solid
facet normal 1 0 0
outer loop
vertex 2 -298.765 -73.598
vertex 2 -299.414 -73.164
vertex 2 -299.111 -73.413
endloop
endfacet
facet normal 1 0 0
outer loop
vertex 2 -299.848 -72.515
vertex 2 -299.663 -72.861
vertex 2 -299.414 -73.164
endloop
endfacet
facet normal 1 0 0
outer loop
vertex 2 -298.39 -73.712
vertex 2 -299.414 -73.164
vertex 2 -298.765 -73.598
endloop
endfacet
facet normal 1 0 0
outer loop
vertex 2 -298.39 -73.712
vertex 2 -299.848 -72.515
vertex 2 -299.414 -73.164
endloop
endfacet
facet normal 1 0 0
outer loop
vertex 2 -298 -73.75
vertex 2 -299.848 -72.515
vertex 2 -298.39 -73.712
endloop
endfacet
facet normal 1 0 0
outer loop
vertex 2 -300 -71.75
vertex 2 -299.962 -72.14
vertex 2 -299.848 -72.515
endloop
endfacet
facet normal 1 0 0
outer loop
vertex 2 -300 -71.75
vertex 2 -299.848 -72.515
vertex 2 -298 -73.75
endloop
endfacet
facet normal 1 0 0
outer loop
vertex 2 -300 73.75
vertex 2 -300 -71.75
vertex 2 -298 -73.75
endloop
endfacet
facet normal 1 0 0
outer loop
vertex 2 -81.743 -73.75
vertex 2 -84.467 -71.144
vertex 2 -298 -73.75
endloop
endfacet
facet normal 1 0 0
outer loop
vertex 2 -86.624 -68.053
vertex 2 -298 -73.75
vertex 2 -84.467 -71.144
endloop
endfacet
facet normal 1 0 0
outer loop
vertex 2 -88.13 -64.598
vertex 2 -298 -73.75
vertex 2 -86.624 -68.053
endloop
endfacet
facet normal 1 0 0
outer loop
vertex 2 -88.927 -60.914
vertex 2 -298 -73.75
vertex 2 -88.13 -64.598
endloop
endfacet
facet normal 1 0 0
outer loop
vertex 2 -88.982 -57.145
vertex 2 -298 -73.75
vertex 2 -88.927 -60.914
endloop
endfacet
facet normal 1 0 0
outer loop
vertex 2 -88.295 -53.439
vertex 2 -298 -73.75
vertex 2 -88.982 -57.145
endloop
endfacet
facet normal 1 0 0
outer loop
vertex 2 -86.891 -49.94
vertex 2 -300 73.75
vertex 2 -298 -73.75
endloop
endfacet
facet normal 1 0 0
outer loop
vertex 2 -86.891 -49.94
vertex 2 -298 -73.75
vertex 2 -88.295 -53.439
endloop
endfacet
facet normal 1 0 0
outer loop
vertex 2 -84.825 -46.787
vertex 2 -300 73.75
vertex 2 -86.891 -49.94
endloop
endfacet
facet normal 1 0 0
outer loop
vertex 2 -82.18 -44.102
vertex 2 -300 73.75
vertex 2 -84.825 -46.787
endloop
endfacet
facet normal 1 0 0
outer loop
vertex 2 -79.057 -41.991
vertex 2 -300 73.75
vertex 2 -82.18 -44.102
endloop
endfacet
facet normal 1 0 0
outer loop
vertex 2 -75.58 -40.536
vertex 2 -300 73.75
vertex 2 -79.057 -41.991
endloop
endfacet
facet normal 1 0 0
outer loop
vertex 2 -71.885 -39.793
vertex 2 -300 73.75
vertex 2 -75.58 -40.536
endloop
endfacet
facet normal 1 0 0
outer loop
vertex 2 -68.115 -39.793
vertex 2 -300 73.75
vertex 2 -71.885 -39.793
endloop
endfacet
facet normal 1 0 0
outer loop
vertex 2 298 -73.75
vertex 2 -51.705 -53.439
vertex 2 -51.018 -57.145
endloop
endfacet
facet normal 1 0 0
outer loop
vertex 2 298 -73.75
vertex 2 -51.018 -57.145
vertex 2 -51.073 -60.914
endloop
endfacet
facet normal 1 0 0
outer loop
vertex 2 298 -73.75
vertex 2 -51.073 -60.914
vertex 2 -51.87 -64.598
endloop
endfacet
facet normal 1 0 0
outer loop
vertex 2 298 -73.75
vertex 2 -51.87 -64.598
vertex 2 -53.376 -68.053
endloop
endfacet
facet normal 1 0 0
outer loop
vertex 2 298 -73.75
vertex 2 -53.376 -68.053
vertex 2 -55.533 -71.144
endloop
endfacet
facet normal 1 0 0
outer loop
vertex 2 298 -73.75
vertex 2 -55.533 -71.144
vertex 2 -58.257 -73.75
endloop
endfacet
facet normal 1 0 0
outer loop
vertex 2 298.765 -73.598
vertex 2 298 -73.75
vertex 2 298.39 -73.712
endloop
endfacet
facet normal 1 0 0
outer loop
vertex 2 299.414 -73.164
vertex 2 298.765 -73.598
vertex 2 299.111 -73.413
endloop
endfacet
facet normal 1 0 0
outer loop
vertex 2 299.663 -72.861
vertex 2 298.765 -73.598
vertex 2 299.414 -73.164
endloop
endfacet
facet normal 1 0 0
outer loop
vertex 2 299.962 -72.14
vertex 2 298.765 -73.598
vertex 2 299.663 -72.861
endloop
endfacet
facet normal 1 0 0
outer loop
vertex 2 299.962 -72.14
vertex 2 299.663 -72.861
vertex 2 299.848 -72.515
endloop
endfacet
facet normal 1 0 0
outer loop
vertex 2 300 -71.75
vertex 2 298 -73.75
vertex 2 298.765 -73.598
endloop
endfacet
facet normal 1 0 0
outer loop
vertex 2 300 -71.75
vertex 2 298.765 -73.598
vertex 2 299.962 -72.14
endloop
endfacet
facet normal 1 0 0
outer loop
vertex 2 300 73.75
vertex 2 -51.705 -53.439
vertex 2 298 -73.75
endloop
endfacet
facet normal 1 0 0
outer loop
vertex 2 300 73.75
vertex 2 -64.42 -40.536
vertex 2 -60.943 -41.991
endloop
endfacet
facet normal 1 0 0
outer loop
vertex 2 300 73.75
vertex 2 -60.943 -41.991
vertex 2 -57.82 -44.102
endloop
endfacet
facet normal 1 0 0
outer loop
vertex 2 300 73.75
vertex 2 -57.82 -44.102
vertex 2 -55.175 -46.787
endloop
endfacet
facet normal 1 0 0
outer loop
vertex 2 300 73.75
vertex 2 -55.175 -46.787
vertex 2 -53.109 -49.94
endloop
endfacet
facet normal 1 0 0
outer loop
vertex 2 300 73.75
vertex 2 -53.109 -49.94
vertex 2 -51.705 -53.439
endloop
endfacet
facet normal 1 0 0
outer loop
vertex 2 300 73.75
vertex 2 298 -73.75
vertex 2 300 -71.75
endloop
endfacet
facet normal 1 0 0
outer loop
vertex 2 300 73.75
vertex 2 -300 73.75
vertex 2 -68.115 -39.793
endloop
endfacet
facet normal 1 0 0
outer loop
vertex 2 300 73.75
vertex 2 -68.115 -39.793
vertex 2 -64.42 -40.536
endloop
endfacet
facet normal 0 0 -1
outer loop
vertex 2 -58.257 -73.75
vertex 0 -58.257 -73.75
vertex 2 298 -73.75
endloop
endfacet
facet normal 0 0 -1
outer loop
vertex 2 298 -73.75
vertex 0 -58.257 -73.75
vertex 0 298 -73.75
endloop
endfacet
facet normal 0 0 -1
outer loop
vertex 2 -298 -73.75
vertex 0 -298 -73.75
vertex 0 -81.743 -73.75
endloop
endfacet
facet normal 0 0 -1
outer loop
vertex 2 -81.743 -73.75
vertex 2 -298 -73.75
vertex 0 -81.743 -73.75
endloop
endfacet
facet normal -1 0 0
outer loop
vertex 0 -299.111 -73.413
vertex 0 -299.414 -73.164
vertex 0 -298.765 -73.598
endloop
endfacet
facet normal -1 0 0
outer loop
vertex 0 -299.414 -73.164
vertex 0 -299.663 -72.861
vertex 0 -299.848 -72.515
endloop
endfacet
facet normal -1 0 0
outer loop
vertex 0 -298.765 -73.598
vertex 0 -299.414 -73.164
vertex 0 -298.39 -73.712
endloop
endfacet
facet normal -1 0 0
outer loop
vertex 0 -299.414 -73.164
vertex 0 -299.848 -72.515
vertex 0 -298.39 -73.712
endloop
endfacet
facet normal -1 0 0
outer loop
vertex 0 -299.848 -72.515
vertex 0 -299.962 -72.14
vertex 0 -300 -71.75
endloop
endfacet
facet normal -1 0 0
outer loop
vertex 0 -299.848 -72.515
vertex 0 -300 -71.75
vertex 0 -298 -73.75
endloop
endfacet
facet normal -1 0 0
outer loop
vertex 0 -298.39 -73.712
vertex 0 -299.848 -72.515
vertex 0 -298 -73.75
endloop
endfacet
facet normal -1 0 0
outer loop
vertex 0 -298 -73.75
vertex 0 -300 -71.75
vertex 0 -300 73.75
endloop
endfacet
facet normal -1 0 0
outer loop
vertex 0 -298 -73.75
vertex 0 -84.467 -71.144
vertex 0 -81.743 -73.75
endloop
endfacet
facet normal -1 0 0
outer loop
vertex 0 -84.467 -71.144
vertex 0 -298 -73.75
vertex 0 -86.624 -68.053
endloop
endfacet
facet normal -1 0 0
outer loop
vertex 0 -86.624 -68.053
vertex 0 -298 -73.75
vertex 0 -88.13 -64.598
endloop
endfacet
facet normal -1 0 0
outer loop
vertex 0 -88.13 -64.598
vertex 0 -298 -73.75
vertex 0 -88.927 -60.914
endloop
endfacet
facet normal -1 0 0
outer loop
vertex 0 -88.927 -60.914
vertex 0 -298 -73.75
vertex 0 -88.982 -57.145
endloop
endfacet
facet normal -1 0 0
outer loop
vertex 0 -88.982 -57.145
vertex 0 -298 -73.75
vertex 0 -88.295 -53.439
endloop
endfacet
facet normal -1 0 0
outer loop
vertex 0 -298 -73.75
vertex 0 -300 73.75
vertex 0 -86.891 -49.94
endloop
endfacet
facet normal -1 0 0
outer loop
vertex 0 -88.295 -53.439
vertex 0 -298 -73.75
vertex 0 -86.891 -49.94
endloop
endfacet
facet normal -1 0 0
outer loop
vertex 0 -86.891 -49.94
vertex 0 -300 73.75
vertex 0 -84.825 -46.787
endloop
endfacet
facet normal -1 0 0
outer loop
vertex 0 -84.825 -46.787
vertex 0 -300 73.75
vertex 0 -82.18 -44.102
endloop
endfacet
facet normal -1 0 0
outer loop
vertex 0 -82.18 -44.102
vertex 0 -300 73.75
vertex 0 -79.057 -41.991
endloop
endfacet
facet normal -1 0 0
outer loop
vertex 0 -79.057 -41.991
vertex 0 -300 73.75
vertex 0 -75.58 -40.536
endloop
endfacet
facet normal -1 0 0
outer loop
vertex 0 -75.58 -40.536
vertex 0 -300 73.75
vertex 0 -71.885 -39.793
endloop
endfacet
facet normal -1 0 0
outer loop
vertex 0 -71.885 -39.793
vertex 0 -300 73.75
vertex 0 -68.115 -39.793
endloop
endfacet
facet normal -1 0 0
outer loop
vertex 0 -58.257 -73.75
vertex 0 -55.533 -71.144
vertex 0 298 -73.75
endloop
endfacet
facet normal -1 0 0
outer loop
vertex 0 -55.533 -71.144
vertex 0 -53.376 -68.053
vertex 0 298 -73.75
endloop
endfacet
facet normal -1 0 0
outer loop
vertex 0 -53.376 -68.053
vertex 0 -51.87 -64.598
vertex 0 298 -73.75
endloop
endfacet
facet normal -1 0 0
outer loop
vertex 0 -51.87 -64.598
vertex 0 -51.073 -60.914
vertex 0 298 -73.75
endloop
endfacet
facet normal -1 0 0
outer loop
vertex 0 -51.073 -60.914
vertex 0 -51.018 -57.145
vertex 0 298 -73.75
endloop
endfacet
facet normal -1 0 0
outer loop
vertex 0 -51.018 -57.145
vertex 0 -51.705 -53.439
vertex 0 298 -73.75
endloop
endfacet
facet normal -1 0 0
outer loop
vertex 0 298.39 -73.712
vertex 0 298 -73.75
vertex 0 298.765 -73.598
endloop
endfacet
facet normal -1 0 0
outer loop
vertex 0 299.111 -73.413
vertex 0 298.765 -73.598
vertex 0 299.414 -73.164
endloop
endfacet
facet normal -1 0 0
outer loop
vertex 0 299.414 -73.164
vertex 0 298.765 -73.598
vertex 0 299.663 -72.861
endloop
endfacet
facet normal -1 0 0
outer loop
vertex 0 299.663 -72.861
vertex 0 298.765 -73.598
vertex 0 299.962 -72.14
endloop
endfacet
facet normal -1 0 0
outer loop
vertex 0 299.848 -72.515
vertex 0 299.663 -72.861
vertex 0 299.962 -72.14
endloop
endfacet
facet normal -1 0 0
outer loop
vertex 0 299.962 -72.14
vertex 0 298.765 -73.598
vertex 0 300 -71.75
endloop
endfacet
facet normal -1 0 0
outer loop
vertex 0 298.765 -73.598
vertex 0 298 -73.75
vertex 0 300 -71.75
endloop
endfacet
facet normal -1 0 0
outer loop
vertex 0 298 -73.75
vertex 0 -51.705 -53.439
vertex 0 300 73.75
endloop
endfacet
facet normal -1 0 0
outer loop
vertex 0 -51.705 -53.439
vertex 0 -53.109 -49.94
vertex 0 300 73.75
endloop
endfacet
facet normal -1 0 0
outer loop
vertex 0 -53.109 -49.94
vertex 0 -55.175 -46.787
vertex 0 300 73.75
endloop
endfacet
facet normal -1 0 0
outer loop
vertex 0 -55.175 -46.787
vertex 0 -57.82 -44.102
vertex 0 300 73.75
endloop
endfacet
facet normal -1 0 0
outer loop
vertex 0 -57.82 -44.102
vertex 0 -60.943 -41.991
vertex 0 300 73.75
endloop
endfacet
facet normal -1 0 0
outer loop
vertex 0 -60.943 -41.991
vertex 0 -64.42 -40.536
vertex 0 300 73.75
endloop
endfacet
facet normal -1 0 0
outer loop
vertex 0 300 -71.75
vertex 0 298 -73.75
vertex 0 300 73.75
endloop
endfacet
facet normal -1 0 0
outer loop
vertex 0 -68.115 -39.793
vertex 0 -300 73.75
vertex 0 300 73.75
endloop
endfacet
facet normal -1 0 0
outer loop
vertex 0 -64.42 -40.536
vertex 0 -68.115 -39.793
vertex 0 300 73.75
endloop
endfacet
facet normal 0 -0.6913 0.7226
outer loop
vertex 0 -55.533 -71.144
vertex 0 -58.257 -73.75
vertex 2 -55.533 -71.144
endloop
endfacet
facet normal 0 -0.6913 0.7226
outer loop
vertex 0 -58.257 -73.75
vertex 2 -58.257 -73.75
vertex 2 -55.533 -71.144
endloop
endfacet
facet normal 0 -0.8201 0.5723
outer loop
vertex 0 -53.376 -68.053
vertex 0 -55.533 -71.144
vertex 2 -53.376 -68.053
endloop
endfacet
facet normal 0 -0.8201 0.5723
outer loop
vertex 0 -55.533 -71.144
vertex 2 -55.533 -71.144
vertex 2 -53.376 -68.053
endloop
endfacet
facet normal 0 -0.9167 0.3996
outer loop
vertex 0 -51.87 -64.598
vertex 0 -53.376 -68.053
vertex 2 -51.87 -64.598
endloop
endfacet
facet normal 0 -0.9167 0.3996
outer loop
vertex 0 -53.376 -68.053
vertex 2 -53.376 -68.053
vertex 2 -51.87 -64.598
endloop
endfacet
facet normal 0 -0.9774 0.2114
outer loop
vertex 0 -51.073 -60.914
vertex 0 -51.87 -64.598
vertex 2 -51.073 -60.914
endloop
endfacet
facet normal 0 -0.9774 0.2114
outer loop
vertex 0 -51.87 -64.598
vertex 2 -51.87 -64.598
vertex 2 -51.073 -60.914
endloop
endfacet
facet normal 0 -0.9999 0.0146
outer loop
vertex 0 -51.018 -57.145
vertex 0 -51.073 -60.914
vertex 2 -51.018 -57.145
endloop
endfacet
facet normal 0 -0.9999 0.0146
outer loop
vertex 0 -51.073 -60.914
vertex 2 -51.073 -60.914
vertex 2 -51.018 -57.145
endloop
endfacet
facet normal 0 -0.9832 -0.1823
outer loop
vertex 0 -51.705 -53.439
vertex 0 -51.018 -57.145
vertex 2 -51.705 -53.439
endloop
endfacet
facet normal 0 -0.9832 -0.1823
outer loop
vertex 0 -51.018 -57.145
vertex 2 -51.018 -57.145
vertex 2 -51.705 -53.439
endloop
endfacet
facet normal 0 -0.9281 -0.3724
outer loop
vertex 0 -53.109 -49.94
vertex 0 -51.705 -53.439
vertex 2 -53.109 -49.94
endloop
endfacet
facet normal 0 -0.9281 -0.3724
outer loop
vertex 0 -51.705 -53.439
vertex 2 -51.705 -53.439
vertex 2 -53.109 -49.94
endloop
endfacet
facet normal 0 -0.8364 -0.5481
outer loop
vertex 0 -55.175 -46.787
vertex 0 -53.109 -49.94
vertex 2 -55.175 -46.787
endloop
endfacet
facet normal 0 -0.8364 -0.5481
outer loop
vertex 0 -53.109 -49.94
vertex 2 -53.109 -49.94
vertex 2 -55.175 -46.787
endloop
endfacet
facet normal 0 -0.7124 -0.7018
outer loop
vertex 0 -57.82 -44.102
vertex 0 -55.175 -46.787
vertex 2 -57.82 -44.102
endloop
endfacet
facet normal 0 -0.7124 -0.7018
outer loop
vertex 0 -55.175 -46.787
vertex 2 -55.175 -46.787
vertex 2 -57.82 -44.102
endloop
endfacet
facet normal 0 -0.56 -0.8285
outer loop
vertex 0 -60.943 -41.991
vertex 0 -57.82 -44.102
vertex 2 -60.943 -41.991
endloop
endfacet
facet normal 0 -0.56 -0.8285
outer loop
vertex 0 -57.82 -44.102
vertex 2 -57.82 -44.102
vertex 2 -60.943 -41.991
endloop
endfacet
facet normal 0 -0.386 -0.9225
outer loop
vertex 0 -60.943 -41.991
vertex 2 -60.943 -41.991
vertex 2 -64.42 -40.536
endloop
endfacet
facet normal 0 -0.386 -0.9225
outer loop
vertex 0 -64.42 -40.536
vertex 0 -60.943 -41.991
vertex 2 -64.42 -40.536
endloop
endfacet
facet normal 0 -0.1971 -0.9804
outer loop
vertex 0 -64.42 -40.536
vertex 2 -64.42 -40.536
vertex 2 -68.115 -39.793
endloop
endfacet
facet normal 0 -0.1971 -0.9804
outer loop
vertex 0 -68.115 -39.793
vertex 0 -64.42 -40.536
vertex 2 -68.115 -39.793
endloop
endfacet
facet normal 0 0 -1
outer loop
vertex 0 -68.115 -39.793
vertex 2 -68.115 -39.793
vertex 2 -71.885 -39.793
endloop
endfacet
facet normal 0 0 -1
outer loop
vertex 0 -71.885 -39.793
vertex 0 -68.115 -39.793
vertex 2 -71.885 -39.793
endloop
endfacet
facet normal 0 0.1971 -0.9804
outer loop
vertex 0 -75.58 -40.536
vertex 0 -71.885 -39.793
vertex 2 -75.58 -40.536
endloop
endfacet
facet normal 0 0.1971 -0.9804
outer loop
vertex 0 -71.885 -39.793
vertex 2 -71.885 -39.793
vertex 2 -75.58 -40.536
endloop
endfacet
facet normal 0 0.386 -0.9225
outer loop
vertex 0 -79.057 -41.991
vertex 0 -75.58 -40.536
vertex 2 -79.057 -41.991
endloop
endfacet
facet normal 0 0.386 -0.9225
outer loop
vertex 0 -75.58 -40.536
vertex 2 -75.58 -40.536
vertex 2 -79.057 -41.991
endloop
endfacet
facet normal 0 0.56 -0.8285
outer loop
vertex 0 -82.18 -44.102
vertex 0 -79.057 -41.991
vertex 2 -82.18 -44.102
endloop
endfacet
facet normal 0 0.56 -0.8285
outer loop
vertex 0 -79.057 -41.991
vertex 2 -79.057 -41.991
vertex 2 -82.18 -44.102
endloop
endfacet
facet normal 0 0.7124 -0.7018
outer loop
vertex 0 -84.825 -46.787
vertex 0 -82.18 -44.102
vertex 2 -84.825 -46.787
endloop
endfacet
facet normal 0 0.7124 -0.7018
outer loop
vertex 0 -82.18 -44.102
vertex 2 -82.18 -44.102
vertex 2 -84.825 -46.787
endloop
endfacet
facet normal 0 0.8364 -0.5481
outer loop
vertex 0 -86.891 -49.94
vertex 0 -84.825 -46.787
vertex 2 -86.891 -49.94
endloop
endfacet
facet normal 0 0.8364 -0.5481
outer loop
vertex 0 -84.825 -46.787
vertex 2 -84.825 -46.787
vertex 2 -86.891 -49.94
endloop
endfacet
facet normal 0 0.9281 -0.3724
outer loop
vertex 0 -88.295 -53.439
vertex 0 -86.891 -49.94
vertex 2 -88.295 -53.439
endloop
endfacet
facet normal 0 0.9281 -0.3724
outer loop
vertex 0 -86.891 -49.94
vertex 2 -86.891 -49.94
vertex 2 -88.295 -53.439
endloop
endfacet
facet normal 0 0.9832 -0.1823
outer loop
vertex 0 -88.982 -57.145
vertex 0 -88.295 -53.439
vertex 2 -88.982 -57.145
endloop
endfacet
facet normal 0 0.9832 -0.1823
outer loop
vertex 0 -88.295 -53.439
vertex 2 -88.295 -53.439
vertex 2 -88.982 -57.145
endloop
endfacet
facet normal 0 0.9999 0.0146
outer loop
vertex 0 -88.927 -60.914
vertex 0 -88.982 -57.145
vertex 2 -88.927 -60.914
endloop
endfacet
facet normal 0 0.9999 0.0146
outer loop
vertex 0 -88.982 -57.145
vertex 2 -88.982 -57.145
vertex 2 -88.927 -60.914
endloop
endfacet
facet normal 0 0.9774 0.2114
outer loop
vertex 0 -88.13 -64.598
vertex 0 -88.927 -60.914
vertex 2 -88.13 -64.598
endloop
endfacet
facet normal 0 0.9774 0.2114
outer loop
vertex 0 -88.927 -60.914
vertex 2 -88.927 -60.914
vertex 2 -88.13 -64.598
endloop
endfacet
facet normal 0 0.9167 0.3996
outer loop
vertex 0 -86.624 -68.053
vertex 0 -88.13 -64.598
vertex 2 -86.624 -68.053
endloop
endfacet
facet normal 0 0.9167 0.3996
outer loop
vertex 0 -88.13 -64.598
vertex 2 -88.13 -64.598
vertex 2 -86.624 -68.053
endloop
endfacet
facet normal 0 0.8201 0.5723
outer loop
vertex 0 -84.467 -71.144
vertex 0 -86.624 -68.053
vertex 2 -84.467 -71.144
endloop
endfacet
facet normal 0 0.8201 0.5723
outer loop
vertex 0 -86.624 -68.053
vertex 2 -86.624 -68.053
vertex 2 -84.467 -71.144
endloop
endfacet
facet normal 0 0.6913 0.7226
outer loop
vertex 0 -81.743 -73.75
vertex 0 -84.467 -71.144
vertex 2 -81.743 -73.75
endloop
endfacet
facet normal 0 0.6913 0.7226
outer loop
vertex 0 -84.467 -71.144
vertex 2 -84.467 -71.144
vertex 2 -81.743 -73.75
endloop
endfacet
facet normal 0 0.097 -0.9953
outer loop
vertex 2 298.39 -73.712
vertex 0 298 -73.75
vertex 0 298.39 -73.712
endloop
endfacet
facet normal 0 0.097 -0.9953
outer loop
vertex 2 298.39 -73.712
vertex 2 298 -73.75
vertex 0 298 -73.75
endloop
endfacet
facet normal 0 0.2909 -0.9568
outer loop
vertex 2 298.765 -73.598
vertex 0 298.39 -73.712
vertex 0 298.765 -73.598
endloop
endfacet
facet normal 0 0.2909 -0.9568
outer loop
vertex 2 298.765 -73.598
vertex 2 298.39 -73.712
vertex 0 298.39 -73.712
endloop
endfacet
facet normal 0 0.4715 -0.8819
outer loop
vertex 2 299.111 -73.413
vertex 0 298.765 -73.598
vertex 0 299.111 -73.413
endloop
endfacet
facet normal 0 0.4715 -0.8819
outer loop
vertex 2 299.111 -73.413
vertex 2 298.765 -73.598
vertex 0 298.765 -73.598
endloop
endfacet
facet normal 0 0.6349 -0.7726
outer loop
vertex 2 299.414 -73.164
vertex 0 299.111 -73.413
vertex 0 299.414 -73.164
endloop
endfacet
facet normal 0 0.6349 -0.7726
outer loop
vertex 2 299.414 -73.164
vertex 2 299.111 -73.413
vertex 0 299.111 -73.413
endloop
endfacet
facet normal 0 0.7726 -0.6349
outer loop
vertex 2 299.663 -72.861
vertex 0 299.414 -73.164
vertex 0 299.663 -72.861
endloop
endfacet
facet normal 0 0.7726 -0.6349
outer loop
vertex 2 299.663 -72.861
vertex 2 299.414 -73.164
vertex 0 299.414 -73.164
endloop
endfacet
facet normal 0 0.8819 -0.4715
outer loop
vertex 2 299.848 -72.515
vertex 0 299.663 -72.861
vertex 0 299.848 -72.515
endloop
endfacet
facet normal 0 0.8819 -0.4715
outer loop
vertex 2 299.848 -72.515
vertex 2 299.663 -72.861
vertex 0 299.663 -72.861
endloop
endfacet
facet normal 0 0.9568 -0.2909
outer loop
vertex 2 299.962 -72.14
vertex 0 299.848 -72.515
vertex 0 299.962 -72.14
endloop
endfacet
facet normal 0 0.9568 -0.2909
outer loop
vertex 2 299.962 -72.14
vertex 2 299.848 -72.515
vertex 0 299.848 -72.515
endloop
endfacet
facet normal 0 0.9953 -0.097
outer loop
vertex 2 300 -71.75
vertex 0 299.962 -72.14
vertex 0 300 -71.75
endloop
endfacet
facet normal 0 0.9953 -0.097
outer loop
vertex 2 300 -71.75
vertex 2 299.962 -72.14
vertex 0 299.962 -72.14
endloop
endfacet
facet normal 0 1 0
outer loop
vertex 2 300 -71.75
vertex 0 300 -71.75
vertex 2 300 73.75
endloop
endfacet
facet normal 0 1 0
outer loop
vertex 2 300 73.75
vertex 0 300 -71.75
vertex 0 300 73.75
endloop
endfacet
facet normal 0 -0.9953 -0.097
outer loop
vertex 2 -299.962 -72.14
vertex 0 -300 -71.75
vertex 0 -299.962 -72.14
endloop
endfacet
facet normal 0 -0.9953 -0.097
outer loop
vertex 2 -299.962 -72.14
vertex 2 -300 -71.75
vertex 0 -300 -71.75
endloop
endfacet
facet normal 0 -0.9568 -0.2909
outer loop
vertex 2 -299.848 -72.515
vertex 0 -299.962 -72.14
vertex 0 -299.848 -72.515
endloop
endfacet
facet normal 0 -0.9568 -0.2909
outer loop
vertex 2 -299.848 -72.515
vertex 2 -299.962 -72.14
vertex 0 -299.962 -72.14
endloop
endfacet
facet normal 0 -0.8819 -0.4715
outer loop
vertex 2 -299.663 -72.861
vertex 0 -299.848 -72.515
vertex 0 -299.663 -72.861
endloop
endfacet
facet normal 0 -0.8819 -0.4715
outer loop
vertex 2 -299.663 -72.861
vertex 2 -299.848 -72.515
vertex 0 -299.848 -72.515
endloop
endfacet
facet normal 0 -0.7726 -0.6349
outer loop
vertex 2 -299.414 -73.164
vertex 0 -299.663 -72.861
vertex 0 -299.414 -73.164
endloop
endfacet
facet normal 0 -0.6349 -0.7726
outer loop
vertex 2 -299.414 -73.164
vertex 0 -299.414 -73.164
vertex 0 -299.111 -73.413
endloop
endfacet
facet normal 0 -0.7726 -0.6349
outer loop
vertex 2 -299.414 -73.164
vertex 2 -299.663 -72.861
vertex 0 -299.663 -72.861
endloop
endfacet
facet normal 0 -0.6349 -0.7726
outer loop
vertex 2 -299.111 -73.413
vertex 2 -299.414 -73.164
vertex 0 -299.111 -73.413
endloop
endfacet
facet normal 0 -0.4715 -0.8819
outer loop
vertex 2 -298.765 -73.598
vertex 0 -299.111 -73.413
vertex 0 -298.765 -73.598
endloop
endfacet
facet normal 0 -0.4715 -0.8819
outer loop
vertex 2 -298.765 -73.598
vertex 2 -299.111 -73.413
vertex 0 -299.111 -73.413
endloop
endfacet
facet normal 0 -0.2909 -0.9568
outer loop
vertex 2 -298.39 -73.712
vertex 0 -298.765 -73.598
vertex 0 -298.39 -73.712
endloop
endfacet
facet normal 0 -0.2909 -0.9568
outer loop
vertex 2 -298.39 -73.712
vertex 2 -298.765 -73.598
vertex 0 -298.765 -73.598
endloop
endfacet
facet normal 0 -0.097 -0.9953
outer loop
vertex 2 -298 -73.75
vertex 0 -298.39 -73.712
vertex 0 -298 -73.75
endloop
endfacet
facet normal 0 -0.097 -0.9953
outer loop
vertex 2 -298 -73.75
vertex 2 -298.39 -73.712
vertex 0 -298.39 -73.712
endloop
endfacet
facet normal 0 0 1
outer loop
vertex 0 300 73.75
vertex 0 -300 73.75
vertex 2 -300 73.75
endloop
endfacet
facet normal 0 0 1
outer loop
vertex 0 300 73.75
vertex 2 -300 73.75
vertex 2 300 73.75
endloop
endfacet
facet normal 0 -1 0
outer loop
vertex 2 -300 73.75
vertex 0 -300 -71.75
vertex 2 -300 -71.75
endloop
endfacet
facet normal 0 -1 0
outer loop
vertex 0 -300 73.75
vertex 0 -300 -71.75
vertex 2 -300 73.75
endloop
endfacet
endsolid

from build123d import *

# Parameters (mm, degrees)
F0_W     = 600
F0_H     = 147.5
F1_DEPTH = 2
F2_R     = 2
F3_R     = 19.05
F4_DEPTH = 25


with BuildPart() as f1:
    # F0 (on Right) → F1 (new body)
    with BuildSketch(Plane.YZ):
        Rectangle(F0_W, F0_H)
    extrude(amount=F1_DEPTH)

    # F2
    f2_edges = [f1.edges().sort_by_distance(p)[0] for p in [
        (1, -300, -73.75),
        (1, 300, -73.75),
    ]]
    fillet(f2_edges, radius=F2_R)

    # F3 (on face) → F4 (cut)
    with BuildSketch(Plane.YZ.offset(2)):
        with Locations((-70, -58.75)):
            Circle(F3_R)
    extrude(amount=-F4_DEPTH, mode=Mode.SUBTRACT)


solid = f1.part
